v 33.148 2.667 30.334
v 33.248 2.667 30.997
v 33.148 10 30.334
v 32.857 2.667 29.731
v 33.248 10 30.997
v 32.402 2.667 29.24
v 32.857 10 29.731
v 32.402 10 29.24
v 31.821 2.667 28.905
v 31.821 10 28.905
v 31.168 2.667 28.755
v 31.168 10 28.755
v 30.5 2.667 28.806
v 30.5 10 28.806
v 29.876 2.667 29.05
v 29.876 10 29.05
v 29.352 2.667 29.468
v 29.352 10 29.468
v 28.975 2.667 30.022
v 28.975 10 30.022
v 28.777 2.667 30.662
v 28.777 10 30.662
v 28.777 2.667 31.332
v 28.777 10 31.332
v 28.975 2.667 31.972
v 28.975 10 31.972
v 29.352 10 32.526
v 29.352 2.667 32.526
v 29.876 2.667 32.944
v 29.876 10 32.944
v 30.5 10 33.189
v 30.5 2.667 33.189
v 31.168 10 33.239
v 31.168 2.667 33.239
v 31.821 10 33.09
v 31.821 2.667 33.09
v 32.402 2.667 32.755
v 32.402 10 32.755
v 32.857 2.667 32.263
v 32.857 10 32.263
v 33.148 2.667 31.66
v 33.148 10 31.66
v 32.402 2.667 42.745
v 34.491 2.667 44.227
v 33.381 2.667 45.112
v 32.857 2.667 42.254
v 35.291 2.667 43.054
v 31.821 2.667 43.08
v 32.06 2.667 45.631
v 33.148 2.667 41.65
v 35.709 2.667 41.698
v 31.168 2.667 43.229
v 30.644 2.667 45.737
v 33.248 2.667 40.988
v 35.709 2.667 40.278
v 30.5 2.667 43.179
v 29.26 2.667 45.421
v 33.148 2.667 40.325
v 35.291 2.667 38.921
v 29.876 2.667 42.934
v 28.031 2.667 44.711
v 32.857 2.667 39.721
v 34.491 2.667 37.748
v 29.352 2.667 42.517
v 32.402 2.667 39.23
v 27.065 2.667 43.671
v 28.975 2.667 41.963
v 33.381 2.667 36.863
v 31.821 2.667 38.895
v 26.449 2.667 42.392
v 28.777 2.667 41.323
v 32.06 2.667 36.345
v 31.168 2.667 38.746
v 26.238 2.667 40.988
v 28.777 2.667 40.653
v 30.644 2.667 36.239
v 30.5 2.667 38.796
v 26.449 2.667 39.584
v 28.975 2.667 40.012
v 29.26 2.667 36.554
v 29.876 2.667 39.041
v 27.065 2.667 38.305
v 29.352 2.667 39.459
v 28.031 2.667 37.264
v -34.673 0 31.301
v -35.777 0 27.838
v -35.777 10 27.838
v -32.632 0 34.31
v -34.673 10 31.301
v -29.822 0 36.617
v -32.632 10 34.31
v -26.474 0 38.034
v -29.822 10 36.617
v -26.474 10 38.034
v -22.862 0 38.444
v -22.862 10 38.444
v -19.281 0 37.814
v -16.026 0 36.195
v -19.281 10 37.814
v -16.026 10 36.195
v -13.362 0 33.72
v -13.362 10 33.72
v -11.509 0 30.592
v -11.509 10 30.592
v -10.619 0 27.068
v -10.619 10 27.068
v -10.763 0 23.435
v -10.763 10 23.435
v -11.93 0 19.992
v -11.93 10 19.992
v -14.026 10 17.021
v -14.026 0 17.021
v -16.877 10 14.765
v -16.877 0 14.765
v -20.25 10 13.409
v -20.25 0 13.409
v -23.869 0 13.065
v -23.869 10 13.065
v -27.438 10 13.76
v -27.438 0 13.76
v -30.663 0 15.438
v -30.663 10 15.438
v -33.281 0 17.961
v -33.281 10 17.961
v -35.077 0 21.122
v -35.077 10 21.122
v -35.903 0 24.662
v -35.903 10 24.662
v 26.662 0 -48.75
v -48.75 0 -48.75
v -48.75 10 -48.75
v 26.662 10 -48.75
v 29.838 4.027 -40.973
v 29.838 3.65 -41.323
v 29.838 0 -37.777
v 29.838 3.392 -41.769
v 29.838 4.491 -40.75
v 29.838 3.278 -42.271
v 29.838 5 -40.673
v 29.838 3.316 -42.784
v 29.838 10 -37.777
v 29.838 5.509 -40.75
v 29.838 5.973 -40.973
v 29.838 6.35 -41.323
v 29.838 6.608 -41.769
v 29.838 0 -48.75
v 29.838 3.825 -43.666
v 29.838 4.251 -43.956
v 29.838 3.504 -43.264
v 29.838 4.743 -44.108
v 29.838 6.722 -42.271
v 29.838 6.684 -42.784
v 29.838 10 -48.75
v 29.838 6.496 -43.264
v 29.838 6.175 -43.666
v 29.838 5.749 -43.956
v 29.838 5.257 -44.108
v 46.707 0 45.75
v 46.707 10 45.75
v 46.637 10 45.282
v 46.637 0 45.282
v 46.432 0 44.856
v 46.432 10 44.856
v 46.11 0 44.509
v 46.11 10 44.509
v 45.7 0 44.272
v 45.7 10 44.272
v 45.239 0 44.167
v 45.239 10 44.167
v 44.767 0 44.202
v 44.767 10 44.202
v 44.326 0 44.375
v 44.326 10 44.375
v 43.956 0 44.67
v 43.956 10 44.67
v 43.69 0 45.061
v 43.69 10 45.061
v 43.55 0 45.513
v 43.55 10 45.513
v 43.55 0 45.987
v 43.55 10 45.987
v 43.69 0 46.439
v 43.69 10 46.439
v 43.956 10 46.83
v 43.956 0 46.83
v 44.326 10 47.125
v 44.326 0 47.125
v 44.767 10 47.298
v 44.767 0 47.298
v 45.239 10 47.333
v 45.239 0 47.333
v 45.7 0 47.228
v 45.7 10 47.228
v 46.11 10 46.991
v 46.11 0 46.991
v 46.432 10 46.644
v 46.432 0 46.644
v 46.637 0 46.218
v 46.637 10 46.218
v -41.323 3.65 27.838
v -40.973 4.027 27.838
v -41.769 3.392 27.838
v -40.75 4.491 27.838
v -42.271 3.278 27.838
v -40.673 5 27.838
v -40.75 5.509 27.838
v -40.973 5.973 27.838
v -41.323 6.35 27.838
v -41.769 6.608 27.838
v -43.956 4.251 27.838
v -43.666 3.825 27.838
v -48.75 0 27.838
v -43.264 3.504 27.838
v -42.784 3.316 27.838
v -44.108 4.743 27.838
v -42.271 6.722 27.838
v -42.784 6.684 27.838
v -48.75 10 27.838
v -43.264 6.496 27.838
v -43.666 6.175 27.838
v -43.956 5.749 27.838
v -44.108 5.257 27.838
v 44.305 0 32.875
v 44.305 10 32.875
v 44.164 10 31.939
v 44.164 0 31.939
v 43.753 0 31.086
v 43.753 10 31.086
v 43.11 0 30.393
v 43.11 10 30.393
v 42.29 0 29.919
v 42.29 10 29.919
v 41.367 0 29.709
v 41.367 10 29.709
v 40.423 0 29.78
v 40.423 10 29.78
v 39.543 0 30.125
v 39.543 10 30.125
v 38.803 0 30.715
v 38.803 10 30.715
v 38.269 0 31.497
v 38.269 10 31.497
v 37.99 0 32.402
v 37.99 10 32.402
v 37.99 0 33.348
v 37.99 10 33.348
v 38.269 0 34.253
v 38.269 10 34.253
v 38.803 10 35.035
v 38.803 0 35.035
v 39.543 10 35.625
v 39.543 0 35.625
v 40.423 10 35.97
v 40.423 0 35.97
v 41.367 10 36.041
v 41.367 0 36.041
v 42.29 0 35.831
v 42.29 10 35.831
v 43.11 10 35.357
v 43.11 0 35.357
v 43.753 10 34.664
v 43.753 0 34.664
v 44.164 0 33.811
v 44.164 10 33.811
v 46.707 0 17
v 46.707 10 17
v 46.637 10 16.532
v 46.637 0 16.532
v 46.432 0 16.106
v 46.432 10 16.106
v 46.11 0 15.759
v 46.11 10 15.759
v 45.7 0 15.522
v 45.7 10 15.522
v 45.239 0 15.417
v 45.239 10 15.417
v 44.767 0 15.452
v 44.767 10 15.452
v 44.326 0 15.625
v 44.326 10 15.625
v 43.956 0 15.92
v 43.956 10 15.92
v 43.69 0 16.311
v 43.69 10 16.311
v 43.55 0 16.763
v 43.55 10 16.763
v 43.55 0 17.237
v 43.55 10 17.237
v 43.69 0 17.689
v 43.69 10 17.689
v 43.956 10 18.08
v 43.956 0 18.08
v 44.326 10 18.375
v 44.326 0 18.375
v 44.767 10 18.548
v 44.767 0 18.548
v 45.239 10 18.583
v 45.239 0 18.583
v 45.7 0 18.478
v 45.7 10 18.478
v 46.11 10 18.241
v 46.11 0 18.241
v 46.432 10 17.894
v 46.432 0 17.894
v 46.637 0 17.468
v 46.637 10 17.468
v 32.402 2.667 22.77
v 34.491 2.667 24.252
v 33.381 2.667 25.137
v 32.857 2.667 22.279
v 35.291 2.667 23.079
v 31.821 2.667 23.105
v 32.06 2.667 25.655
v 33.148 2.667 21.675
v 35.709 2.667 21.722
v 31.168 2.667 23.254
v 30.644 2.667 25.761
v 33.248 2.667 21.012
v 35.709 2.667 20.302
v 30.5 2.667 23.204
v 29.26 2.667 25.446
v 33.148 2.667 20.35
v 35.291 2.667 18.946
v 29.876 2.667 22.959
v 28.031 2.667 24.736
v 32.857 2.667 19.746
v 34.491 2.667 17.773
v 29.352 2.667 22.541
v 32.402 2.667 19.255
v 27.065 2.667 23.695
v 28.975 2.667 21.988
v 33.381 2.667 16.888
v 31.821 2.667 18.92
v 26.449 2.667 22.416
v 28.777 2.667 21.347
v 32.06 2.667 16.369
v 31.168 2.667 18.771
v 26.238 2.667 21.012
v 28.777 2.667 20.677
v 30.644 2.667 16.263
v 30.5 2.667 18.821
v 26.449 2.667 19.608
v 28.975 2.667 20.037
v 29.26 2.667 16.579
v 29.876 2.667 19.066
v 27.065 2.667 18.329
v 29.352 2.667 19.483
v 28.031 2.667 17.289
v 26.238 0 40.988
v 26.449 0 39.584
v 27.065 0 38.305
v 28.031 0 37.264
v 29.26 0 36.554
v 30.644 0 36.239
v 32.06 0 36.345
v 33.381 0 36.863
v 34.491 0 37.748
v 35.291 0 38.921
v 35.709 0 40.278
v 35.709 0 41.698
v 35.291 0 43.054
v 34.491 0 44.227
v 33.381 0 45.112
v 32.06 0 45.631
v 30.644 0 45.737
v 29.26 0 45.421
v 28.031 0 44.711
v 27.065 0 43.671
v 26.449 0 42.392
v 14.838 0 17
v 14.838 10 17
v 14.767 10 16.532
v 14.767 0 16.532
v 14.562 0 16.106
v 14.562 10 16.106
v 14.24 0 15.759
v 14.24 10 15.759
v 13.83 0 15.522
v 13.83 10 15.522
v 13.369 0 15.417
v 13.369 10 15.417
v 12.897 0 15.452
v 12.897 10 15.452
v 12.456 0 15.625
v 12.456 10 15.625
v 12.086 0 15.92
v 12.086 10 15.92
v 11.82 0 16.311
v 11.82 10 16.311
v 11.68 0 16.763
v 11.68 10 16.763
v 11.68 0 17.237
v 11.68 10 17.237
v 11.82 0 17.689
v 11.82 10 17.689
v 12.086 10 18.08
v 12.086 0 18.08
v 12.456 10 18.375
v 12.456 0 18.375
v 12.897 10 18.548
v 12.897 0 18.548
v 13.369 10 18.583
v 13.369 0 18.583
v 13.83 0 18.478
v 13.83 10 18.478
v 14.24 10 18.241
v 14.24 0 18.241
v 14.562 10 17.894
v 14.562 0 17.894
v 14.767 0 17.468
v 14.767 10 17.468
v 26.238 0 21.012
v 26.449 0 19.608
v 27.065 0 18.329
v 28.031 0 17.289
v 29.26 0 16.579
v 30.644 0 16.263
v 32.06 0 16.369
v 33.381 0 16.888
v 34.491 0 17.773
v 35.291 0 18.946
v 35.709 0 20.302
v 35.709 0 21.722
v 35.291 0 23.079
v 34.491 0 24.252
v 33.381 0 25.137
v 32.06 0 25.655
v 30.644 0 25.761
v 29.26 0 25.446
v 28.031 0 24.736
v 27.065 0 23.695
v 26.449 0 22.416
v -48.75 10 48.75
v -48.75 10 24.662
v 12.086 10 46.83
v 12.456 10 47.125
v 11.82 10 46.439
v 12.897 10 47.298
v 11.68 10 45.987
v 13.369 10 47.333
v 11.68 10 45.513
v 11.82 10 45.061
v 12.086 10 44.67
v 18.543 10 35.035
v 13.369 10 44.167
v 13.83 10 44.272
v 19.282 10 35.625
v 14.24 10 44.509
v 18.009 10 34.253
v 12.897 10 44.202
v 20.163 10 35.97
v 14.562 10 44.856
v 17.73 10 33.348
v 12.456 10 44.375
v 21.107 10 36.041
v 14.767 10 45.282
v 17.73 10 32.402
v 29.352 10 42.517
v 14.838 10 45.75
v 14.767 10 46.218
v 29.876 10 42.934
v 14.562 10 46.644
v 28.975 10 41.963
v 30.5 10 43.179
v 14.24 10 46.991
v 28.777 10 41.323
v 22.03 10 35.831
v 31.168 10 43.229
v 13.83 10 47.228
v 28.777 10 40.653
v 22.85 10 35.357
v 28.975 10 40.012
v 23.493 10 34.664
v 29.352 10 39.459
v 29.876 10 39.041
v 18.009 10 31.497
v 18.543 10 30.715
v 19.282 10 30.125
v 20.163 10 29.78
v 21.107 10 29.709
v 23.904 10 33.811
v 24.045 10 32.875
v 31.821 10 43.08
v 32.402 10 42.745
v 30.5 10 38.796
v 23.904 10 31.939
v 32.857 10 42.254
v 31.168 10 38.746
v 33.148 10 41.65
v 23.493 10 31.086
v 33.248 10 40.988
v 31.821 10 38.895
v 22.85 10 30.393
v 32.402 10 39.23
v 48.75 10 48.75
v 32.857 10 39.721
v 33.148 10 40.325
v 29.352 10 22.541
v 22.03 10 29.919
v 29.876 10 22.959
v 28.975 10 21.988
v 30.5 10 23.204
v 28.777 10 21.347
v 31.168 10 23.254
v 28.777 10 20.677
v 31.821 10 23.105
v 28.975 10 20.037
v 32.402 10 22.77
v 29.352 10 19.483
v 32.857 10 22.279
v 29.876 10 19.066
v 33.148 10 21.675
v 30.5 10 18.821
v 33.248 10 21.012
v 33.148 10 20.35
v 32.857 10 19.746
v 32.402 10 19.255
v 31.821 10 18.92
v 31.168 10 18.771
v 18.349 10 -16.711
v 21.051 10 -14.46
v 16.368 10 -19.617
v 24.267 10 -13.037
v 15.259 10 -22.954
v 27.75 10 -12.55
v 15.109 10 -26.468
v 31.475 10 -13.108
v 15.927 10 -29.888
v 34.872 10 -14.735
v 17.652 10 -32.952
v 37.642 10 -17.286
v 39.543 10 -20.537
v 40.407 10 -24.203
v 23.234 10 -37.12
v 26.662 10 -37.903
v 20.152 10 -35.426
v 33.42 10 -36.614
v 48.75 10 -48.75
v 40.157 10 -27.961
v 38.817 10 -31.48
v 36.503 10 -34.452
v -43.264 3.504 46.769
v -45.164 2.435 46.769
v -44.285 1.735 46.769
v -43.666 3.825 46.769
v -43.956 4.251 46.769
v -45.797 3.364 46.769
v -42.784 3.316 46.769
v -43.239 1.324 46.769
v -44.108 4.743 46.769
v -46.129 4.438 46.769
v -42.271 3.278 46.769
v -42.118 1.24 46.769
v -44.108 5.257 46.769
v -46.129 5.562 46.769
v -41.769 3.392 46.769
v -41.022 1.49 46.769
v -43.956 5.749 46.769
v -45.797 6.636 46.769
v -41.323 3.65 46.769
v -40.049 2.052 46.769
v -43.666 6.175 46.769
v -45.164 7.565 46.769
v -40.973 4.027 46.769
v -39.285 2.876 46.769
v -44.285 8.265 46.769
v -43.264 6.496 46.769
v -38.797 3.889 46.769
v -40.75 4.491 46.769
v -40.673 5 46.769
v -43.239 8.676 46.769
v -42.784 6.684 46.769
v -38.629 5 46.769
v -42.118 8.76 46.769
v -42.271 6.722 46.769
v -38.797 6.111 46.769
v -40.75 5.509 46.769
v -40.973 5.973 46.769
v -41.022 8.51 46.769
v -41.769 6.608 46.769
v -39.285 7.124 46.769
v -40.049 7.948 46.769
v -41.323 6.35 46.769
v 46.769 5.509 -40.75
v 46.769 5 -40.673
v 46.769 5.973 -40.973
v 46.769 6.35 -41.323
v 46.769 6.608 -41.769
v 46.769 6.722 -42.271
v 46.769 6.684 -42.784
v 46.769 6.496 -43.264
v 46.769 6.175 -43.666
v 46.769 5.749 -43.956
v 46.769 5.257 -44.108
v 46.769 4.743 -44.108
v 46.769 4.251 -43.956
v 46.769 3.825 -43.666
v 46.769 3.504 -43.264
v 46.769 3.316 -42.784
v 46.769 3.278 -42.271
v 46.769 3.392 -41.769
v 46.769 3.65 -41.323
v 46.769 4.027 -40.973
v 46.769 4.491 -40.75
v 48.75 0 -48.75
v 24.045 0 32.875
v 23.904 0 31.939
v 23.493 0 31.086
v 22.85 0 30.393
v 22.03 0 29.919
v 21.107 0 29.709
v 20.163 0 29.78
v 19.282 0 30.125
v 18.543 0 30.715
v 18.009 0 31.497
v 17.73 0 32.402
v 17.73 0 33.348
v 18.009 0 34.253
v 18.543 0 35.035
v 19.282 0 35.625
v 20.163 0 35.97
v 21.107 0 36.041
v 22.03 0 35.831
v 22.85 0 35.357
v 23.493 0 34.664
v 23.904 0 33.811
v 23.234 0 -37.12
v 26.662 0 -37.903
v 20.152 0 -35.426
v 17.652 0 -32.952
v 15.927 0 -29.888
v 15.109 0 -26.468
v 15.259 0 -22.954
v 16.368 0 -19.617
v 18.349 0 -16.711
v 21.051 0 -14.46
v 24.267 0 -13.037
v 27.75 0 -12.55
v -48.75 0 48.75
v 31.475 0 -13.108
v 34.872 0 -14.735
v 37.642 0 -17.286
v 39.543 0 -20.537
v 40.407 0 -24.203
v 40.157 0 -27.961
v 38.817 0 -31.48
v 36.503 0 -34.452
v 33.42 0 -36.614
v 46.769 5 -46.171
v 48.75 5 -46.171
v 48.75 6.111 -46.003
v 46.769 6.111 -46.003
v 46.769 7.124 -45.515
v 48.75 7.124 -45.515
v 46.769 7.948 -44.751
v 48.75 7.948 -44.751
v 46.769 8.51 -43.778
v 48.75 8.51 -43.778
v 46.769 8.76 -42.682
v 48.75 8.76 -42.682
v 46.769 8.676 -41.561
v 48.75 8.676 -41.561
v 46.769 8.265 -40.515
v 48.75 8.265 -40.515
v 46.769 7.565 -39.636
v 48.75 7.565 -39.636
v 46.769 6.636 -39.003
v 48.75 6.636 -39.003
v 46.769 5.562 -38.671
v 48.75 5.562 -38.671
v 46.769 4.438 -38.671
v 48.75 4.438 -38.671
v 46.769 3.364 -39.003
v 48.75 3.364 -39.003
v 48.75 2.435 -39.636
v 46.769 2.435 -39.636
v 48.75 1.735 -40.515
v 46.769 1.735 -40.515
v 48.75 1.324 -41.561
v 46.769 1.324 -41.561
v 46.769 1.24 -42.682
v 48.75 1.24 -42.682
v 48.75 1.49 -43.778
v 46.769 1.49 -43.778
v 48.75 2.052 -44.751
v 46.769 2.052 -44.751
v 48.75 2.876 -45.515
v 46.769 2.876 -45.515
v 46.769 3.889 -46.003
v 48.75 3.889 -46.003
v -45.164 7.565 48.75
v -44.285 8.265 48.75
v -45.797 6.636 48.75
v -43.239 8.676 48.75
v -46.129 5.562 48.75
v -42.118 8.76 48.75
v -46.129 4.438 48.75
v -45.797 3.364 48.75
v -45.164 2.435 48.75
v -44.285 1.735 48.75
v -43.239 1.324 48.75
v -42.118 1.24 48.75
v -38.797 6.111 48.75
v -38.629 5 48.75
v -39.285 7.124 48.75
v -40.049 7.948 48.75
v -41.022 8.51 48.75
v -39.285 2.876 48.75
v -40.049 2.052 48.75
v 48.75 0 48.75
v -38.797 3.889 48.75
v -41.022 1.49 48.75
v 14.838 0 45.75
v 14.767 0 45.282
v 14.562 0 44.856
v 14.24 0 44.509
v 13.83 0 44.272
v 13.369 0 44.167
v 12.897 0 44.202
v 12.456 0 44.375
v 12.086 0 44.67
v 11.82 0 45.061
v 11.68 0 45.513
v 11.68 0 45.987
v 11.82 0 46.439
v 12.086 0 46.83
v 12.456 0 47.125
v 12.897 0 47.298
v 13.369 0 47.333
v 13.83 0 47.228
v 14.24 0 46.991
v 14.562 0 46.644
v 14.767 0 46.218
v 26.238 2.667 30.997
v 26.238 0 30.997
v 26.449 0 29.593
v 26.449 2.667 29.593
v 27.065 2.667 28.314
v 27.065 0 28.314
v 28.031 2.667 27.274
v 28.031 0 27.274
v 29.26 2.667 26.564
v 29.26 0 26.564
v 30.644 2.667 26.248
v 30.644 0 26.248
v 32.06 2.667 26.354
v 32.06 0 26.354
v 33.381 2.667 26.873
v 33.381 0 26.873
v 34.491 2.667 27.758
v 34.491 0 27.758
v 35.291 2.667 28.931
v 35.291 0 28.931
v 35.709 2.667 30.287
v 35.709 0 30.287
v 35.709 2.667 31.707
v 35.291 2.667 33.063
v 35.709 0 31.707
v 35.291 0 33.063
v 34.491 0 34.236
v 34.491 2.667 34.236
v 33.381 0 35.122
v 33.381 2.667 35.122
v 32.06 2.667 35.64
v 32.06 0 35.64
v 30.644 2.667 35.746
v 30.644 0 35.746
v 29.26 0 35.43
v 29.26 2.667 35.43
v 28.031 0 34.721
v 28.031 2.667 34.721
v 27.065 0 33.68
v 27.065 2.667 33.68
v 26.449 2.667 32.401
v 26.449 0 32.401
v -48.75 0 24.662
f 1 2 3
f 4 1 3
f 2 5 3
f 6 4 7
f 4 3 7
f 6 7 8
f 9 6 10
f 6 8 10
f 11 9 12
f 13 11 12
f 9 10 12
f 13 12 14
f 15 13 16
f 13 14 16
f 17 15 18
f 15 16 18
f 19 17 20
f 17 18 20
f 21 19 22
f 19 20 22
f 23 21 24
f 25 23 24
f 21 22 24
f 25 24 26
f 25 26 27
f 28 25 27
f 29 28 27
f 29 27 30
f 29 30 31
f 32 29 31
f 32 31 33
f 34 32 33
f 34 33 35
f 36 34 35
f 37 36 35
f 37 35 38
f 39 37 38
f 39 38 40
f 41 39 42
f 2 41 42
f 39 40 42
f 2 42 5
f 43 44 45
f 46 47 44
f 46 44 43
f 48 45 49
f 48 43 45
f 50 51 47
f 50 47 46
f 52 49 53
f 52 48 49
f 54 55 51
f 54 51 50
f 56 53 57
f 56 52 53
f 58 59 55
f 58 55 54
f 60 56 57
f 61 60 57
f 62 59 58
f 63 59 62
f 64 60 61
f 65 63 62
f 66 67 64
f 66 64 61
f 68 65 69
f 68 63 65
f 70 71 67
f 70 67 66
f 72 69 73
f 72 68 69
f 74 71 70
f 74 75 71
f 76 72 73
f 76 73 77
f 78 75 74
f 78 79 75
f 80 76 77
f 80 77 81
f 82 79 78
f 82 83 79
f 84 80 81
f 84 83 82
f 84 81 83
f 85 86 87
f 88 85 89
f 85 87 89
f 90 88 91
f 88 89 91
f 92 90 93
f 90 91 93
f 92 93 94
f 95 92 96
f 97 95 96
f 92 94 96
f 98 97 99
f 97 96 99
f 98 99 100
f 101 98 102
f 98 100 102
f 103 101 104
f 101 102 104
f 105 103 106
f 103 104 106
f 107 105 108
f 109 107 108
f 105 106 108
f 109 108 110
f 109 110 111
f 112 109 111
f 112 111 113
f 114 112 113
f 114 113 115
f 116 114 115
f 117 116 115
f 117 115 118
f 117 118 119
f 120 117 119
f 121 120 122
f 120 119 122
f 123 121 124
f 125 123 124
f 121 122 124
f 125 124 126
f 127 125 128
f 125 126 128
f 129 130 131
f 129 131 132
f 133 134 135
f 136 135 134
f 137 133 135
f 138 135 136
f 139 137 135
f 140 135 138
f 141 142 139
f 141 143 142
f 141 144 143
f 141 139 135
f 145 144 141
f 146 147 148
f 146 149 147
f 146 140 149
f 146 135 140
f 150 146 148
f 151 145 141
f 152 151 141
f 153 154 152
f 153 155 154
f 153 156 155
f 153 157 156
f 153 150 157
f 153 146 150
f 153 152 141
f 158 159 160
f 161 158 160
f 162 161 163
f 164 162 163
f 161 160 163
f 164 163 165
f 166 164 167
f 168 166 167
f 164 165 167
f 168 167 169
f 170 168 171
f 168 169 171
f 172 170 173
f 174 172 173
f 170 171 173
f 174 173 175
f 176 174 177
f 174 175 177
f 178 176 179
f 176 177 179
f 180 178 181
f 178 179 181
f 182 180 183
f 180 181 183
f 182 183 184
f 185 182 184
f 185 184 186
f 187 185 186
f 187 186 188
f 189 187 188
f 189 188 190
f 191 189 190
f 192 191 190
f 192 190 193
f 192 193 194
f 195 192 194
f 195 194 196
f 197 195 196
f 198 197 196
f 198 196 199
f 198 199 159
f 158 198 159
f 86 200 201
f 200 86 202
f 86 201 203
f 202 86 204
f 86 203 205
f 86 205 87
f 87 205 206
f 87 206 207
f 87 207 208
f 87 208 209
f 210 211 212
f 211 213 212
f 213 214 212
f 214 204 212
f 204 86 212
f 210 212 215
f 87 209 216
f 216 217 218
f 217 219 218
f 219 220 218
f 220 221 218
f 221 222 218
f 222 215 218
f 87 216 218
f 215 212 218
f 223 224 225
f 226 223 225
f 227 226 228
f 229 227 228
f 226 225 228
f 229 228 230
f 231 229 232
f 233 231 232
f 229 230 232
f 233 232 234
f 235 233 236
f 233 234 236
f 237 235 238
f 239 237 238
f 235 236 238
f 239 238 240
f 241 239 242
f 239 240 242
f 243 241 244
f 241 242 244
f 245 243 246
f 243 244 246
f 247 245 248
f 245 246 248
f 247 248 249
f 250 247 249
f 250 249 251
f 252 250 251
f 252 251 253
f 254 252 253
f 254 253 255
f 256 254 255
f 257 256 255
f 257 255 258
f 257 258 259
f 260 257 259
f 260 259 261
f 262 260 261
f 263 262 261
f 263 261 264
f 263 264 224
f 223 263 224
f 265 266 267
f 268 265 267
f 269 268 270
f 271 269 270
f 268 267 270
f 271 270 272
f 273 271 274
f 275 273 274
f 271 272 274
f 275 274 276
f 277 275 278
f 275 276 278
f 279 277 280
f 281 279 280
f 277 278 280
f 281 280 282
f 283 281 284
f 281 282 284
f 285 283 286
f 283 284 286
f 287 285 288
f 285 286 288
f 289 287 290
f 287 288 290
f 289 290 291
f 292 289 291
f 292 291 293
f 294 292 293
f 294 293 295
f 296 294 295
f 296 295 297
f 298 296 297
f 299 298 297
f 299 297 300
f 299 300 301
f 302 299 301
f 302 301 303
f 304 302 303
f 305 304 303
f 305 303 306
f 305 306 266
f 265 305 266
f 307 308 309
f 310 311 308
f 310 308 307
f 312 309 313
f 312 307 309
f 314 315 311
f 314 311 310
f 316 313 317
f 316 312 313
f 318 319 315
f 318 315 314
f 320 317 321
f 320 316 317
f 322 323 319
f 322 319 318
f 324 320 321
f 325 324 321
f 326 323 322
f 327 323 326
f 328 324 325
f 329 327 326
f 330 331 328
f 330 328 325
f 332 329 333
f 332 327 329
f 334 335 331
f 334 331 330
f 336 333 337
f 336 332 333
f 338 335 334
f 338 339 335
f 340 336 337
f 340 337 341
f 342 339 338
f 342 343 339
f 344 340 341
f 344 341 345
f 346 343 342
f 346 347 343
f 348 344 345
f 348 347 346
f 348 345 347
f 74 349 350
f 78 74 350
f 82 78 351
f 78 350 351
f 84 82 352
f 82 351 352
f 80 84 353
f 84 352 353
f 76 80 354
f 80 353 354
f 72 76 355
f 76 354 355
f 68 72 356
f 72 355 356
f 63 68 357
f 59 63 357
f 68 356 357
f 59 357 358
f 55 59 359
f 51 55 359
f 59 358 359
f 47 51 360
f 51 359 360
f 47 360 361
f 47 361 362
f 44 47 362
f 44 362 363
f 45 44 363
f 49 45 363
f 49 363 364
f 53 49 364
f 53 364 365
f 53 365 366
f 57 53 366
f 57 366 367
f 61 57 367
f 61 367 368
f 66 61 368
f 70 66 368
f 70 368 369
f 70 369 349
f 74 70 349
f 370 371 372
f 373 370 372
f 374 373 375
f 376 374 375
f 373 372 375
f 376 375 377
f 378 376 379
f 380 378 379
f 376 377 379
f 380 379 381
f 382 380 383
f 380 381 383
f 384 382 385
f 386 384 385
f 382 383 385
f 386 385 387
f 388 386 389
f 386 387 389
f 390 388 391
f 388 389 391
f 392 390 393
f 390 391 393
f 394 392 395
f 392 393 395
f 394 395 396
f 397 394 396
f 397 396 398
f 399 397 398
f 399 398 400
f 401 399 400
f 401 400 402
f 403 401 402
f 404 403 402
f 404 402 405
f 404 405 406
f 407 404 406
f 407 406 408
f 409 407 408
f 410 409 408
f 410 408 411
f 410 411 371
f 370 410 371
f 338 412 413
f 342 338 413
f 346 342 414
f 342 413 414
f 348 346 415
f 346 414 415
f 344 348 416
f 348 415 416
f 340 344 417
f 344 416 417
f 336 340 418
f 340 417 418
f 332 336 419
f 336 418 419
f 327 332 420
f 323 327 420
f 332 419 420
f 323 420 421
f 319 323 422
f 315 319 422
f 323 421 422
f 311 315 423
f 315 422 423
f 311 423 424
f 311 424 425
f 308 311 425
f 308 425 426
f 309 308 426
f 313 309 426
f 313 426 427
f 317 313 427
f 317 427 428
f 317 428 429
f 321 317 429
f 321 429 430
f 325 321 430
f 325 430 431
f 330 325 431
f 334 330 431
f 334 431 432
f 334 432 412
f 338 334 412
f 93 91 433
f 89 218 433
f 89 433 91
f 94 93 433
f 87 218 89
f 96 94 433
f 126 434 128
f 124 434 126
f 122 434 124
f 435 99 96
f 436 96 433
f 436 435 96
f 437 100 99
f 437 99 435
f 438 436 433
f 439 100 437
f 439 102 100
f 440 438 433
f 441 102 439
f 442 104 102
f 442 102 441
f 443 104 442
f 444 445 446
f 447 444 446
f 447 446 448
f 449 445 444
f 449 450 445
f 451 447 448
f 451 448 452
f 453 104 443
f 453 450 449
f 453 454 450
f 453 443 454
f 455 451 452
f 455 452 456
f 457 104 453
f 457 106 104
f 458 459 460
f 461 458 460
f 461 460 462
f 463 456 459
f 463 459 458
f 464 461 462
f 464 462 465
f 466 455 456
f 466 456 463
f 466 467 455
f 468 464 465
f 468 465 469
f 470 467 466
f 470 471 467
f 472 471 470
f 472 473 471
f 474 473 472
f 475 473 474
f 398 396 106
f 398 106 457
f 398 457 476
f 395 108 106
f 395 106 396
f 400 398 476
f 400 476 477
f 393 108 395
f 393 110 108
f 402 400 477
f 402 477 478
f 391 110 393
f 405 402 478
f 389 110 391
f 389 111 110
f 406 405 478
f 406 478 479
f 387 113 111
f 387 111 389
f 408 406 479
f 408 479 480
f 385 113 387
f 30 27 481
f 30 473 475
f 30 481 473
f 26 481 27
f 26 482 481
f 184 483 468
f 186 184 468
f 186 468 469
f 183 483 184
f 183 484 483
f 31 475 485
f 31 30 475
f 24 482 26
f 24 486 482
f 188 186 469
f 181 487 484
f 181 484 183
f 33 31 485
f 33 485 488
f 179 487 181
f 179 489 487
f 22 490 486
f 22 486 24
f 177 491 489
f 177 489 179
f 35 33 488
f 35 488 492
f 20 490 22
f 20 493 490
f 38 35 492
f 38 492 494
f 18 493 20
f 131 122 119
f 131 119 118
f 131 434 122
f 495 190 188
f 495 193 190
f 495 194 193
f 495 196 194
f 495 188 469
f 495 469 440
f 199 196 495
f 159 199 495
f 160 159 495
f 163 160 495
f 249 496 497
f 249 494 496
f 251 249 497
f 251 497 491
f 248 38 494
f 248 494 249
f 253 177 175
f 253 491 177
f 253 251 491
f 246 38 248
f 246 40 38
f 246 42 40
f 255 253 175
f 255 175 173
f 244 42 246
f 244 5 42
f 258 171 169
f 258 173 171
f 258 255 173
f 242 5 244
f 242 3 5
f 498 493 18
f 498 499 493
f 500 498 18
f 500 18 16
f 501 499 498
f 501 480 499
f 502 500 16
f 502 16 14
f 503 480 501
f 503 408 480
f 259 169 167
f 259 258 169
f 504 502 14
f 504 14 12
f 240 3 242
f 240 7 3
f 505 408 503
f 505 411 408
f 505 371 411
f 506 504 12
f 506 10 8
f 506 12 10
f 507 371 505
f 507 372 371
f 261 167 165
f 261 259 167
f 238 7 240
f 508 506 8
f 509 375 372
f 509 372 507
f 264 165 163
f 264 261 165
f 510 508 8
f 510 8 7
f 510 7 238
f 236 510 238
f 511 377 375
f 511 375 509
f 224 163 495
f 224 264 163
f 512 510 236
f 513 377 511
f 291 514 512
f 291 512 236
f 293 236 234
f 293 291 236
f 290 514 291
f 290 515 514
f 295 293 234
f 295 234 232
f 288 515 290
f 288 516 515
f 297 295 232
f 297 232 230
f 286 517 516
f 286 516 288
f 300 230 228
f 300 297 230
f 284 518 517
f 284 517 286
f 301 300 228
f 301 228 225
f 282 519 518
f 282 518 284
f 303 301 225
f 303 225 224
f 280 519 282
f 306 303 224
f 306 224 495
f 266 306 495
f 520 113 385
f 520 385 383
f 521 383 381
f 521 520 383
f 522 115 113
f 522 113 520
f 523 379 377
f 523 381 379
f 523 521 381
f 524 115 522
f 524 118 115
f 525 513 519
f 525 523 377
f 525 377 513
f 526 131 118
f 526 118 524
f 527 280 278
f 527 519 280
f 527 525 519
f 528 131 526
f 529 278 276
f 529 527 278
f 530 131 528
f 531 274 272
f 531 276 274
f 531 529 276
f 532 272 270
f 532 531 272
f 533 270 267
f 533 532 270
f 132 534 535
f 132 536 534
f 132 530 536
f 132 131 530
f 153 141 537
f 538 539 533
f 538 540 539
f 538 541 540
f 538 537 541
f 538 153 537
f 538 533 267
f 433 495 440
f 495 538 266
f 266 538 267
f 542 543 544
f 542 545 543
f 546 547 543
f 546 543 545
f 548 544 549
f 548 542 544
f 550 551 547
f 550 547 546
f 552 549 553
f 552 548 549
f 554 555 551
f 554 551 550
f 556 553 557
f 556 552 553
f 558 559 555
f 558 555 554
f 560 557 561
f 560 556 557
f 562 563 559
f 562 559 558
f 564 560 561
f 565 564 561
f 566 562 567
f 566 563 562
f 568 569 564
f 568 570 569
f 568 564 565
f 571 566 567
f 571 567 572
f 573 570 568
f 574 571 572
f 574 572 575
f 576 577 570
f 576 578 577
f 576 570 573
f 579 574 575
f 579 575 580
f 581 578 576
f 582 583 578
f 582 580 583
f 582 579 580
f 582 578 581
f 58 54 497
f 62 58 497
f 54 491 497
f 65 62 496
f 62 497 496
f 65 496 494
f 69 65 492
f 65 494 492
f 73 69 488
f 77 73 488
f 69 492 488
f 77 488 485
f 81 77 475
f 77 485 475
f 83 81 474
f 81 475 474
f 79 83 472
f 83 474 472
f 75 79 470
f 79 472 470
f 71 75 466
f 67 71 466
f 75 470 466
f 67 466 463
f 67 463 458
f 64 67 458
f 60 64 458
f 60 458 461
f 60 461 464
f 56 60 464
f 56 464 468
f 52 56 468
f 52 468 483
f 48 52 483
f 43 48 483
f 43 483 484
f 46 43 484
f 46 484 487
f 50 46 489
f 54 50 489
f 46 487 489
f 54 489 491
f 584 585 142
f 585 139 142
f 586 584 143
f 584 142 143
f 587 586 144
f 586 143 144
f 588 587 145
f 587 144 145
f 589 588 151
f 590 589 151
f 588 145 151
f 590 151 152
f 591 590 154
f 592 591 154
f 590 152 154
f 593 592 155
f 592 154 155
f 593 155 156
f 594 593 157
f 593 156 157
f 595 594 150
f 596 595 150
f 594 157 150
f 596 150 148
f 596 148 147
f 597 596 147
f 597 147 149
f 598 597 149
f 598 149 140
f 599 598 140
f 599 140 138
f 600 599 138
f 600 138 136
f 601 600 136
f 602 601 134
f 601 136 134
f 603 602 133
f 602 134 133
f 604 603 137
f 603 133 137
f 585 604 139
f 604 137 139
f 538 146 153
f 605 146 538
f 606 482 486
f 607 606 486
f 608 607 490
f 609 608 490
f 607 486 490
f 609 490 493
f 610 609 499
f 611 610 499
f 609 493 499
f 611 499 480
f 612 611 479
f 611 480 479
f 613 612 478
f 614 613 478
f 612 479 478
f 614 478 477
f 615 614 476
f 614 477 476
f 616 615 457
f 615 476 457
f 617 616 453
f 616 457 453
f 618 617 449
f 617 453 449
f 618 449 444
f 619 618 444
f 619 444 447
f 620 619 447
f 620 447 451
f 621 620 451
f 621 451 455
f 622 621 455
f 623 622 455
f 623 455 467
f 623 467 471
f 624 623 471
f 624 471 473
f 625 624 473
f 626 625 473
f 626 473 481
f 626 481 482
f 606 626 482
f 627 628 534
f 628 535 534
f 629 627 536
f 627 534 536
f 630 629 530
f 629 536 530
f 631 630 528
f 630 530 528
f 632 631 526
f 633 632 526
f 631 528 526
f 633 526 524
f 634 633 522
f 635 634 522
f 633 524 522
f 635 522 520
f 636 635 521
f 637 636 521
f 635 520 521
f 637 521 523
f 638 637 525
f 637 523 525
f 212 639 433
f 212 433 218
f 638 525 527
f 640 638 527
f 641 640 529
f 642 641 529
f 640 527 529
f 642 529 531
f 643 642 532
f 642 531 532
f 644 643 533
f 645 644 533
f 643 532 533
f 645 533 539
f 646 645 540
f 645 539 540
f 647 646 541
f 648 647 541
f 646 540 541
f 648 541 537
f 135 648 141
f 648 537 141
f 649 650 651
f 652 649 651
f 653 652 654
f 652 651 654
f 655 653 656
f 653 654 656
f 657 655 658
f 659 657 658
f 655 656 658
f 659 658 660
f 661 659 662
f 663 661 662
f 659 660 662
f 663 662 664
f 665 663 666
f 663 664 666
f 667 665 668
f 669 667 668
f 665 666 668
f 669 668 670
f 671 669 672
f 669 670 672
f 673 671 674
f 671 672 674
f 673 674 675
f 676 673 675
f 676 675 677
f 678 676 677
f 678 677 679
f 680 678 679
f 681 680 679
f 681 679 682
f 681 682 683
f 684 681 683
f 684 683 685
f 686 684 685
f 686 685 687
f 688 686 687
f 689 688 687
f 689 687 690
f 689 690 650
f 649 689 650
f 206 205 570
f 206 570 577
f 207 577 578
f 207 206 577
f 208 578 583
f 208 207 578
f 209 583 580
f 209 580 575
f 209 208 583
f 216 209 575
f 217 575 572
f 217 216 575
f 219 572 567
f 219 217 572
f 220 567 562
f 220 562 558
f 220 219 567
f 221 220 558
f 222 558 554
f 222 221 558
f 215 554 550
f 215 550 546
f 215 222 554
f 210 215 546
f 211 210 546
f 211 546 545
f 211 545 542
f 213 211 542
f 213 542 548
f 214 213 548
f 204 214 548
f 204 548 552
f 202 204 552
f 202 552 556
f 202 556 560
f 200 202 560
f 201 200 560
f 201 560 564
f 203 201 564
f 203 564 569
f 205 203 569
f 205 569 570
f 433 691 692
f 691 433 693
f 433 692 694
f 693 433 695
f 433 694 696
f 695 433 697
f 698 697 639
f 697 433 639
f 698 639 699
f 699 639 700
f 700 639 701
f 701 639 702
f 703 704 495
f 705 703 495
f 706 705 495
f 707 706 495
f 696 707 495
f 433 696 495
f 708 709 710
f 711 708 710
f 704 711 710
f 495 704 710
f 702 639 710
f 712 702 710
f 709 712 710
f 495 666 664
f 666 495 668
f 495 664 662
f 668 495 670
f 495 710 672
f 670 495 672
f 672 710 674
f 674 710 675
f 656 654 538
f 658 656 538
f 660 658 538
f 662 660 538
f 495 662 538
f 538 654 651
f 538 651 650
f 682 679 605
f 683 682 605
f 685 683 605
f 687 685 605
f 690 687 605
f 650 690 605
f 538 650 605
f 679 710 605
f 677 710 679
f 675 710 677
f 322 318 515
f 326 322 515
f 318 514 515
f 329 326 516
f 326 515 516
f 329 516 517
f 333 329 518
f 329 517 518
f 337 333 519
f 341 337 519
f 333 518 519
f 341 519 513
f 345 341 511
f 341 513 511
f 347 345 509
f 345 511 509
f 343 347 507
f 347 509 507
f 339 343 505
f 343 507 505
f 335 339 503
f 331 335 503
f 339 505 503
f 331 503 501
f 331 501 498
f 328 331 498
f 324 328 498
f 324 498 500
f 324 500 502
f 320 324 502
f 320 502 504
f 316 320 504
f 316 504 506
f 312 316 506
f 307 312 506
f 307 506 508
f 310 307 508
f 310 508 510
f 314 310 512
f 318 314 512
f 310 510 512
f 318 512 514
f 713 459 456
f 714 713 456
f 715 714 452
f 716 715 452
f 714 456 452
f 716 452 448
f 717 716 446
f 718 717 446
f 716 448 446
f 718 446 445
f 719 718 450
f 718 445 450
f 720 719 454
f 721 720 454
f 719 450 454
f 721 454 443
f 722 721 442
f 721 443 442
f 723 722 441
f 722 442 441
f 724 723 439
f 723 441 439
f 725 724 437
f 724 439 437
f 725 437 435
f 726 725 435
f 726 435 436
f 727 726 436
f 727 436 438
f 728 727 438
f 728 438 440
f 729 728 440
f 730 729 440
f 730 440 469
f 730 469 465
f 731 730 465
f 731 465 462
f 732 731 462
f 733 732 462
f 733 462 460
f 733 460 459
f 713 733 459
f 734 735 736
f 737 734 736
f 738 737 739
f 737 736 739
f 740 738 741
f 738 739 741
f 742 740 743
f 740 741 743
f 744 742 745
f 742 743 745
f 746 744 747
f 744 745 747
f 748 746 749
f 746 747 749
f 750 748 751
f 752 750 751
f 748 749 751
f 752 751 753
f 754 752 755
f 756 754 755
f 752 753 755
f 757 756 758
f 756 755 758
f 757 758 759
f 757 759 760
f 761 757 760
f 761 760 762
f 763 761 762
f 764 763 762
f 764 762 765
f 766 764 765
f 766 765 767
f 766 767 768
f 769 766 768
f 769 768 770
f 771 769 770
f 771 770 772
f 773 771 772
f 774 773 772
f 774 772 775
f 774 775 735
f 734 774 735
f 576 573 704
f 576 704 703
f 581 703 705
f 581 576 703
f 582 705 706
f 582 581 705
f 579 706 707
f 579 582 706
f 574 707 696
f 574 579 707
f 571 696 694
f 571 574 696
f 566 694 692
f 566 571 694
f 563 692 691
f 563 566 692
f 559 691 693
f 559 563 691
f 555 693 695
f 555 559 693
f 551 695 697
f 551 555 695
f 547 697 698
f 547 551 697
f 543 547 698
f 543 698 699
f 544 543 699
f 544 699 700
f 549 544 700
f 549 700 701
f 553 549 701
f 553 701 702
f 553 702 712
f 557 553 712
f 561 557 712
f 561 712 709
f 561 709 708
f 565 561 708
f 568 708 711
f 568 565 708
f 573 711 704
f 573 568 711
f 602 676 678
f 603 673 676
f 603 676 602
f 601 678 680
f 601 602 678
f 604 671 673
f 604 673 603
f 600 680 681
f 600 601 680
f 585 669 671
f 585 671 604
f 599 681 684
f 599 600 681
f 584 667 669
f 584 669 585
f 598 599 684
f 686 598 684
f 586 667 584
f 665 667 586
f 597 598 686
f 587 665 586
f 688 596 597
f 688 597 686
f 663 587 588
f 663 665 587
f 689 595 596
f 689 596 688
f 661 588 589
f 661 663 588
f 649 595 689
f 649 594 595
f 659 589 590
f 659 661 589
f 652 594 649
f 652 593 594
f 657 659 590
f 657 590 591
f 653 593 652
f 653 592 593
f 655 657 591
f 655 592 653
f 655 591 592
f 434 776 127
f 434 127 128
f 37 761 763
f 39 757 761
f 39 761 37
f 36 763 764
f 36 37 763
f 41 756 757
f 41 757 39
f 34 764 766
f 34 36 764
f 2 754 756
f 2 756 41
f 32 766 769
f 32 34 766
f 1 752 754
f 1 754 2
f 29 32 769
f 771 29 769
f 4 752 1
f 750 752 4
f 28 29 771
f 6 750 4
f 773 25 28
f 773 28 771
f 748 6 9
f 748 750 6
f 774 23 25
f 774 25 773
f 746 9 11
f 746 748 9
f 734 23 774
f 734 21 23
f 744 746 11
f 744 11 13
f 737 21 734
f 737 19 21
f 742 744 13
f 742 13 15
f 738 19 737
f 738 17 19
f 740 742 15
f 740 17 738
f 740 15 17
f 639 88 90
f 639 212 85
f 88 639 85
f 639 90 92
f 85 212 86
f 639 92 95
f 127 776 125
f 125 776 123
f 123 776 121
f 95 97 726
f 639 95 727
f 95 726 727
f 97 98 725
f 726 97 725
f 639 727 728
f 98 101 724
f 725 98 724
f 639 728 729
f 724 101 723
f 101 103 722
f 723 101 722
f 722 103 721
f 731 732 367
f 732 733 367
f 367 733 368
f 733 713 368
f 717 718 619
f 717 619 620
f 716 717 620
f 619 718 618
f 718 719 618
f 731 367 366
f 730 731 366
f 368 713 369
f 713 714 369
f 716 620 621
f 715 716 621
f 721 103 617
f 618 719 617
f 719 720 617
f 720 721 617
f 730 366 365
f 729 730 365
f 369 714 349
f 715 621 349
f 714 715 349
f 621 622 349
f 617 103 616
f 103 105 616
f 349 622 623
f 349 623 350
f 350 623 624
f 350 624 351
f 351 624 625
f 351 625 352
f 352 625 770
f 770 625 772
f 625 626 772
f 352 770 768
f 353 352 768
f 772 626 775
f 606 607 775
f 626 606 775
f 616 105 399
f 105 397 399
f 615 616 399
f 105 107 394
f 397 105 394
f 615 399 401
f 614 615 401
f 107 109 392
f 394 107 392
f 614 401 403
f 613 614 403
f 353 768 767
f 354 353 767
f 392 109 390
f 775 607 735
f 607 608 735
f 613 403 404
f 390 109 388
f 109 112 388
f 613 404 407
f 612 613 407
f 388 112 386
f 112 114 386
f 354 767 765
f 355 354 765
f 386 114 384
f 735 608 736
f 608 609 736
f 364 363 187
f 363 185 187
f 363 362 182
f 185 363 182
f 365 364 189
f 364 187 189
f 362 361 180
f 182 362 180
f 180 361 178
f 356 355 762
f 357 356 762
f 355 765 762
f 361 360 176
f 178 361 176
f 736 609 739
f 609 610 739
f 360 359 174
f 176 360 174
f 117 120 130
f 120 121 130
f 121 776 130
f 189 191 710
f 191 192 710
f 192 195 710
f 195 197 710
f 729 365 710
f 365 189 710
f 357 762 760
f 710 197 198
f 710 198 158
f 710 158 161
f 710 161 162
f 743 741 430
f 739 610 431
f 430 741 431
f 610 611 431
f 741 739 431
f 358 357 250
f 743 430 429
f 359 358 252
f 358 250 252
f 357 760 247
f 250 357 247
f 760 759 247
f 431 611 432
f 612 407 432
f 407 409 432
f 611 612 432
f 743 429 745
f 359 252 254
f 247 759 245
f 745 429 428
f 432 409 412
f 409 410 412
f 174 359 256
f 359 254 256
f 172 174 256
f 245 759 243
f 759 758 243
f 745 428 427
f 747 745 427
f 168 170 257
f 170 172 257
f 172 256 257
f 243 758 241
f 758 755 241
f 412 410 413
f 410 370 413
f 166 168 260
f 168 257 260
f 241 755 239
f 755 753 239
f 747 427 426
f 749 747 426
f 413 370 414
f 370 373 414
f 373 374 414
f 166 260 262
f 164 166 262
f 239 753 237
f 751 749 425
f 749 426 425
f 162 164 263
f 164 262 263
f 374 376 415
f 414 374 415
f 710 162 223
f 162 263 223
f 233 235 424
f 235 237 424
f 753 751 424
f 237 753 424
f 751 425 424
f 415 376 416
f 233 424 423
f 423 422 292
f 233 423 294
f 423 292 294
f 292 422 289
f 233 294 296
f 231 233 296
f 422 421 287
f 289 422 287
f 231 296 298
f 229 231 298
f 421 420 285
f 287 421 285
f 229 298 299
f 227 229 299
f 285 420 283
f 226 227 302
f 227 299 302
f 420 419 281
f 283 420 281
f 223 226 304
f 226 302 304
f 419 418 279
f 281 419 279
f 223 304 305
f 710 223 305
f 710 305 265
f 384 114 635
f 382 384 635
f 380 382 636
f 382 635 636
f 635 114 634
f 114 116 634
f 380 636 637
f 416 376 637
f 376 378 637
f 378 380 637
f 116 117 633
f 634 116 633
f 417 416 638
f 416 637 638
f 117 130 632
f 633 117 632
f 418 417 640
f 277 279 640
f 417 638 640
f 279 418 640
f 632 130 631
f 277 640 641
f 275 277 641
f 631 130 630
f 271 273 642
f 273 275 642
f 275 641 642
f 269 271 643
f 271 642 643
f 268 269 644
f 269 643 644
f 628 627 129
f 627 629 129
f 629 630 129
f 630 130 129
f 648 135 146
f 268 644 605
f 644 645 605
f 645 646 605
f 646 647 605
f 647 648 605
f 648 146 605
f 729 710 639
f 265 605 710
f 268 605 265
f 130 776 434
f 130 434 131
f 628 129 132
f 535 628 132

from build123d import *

# Parameters (mm, degrees)
SKETCH1_W                                           = 97.5
SKETCH1_H                                           = 97.5
BOSS_EXTRUDE1_DEPTH                                 = 10
CUT_EXTRUDE4_REACH                                  = 71.664
SKETCH14_R                                          = 12.7
CUT_EXTRUDE5_REACH                                  = 111.466
CUT_EXTRUDE5_END_RADIUS                             = 12.7
SKETCH15_W                                          = 3.175
SKETCH15_H                                          = 10
CUT_EXTRUDE6_REACH                                  = 111.466
CUT_EXTRUDE6_END_RADIUS                             = 12.7
SKETCH16_W                                          = 3.175
SKETCH16_H                                          = 10
CBORE_START                                         = 27.8375
CBORE_FOR_5_BINDING_HEAD_MACHINE_SC_2_R             = 1.7272
CBORE_FOR_5_BINDING_HEAD_MACHINE_SCREW2_DEPTH       = 20.9125
CBORE_START_2                                       = 46.7688
CBORE_FOR_5_BINDING_HEAD_MACHINE_SC_3_O_R           = 3.77063
CBORE_FOR_5_BINDING_HEAD_MACHINE_SC_3_O_R_2         = 1.7272
CBORE_FOR_5_BINDING_HEAD_MACHINE_SC_3_DEPTH         = 1.9812
CBORE_FOR_5_BINDING_HEAD_MACHINE_SCREW3_D           = 3.4544
CBORE_FOR_5_BINDING_HEAD_MACHINE_SCREW3_DEPTH       = 22.0865
CBORE_FOR_5_BINDING_HEAD_MACHINE_SCREW3_CBORE_D     = 7.54126
CBORE_FOR_5_BINDING_HEAD_MACHINE_SCREW3_CBORE_DEPTH = 1.9812
F_1_8_0_125_DIAMETER_HOLE2_D                        = 3.175
CBORE_FOR_8_BINDING_HEAD_MACHINE_SCREW1_D           = 4.4958
CBORE_FOR_8_BINDING_HEAD_MACHINE_SCREW1_CBORE_D     = 9.525
CBORE_FOR_8_BINDING_HEAD_MACHINE_SCREW1_CBORE_DEPTH = 2.667
F_1_4_0_25_DIAMETER_HOLE2_D                         = 6.35


# Read off the part's stored shape, not the designer's step: CBORE for #5 Binding Head Machine Screw2
with BuildPart() as part:
    # Sketch1 → Boss-Extrude1 (new body)
    with BuildSketch(Plane(origin=(0, 0, 0), x_dir=(1, 0, 0), z_dir=(0, 1, 0))):
        Rectangle(SKETCH1_W, SKETCH1_H)
    extrude(amount=BOSS_EXTRUDE1_DEPTH)

    # Sketch14 → Cut-Extrude4 (cut, up to next)
    with BuildSketch(Plane(origin=(0, 10, 0), x_dir=(1, 0, 0), z_dir=(0, 1, 0)), mode=Mode.PRIVATE) as cut_extrude4_sk1:
        with Locations(Location((-23.25, -25.75, 0), (0, 0, 270))):
            Circle(SKETCH14_R)
    cut_extrude4_tool1 = extrude(cut_extrude4_sk1.sketch, amount=-CUT_EXTRUDE4_REACH, mode=Mode.PRIVATE) & part.part
    # Sketch14 → Cut-Extrude4 (cut, up to next)
    with BuildSketch(Plane(origin=(0, 10, 0), x_dir=(1, 0, 0), z_dir=(0, 1, 0)), mode=Mode.PRIVATE) as cut_extrude4_sk2:
        with Locations(Location((27.75, 25.25, 0), (0, 0, 270))):
            Circle(SKETCH14_R)
    cut_extrude4_tool2 = extrude(cut_extrude4_sk2.sketch, amount=-CUT_EXTRUDE4_REACH, mode=Mode.PRIVATE) & part.part
    add(cut_extrude4_tool1.solids().sort_by_distance((-23.25, 10, 25.75))[0], mode=Mode.SUBTRACT)
    add(cut_extrude4_tool2.solids().sort_by_distance((27.75, 10, -25.25))[0], mode=Mode.SUBTRACT)

    # Cut-Extrude5: up to this cylinder (the profile starts outside it)
    cut_extrude5_end = Plane(origin=(-23.25, 5, 25.75), z_dir=(0, 1, 0)) * Cylinder(CUT_EXTRUDE5_END_RADIUS, 249.332, mode=Mode.PRIVATE)
    # Sketch15 → Cut-Extrude5 (cut, up to the surface)
    with BuildSketch(Plane.ZY.offset(48.75), mode=Mode.PRIVATE) as cut_extrude5_sk1:
        with Locations((26.25, 5)):
            Rectangle(SKETCH15_W, SKETCH15_H)
    cut_extrude5_tool1 = extrude(cut_extrude5_sk1.sketch, amount=-CUT_EXTRUDE5_REACH, mode=Mode.PRIVATE) - cut_extrude5_end
    add(cut_extrude5_tool1.solids().sort_by_distance((-48.75, 5, 26.25))[0], mode=Mode.SUBTRACT)

    # Cut-Extrude6: up to this cylinder (the profile starts outside it)
    cut_extrude6_end = Plane(origin=(27.75, 5, -25.25), z_dir=(0, 1, 0)) * Cylinder(CUT_EXTRUDE6_END_RADIUS, 249.332, mode=Mode.PRIVATE)
    # Sketch16 → Cut-Extrude6 (cut, up to the surface)
    with BuildSketch(Plane(origin=(0, 0, -48.75), x_dir=(-1, 0, 0), z_dir=(0, 0, -1)), mode=Mode.PRIVATE) as cut_extrude6_sk1:
        with Locations((-28.25, 5)):
            Rectangle(SKETCH16_W, SKETCH16_H)
    cut_extrude6_tool1 = extrude(cut_extrude6_sk1.sketch, amount=-CUT_EXTRUDE6_REACH, mode=Mode.PRIVATE) - cut_extrude6_end
    add(cut_extrude6_tool1.solids().sort_by_distance((28.25, 5, -48.75))[0], mode=Mode.SUBTRACT)

    # CBORE for _5 Binding Head Machine Sc 2 → CBORE for #5 Binding Head Machine Screw2 (cut)
    with BuildSketch(Plane.XY.offset(CBORE_START)):
        with Locations((-42.4, 5)):
            Circle(CBORE_FOR_5_BINDING_HEAD_MACHINE_SC_2_R)
    extrude(amount=CBORE_FOR_5_BINDING_HEAD_MACHINE_SCREW2_DEPTH, mode=Mode.SUBTRACT)

    # CBORE for _5 Binding Head Machine Sc 3 o → CBORE for _5 Binding Head Machine Sc 3 (cut)
    with BuildSketch(Plane.XY.offset(CBORE_START_2)):
        with Locations((-42.4, 5)):
            Circle(CBORE_FOR_5_BINDING_HEAD_MACHINE_SC_3_O_R)
        with Locations((-42.4, 5)):
            Circle(CBORE_FOR_5_BINDING_HEAD_MACHINE_SC_3_O_R_2, mode=Mode.SUBTRACT)
    extrude(amount=CBORE_FOR_5_BINDING_HEAD_MACHINE_SC_3_DEPTH, mode=Mode.SUBTRACT)

    # CBORE for #5 Binding Head Machine Screw3
    with Locations(Plane(origin=(48.75, 0, 0), x_dir=(0, 0, -1), z_dir=(1, 0, 0))):
        with Locations((42.4, 5)):
            CounterBoreHole(CBORE_FOR_5_BINDING_HEAD_MACHINE_SCREW3_D / 2, CBORE_FOR_5_BINDING_HEAD_MACHINE_SCREW3_CBORE_D / 2, CBORE_FOR_5_BINDING_HEAD_MACHINE_SCREW3_CBORE_DEPTH, depth=CBORE_FOR_5_BINDING_HEAD_MACHINE_SCREW3_DEPTH)

    # 1/8 (0.125) Diameter Hole2 (through all)
    with Locations(Plane(origin=(0, 0, 0), x_dir=(-1, 0, 0), z_dir=(0, -1, 0))):
        with Locations((-13.25, -45.75), (-45.12, -45.75), (-13.25, -17), (-45.12, -17)):
            Hole(F_1_8_0_125_DIAMETER_HOLE2_D / 2)

    # CBORE for #8 Binding Head Machine Screw1 (through all)
    with Locations(Plane(origin=(0, 0, 0), x_dir=(-1, 0, 0), z_dir=(0, -1, 0))):
        with Locations((-31, -40.98776), (-31, -21.01224), (-31, -30.997066185)):
            CounterBoreHole(CBORE_FOR_8_BINDING_HEAD_MACHINE_SCREW1_D / 2, CBORE_FOR_8_BINDING_HEAD_MACHINE_SCREW1_CBORE_D / 2, CBORE_FOR_8_BINDING_HEAD_MACHINE_SCREW1_CBORE_DEPTH)

    # 1/4 (0.25) Diameter Hole2 (through all)
    with Locations(Plane(origin=(0, 0, 0), x_dir=(-1, 0, 0), z_dir=(0, -1, 0))):
        with Locations((-20.87, -32.875), (-41.13, -32.875)):
            Hole(F_1_4_0_25_DIAMETER_HOLE2_D / 2)


solid = part.part
